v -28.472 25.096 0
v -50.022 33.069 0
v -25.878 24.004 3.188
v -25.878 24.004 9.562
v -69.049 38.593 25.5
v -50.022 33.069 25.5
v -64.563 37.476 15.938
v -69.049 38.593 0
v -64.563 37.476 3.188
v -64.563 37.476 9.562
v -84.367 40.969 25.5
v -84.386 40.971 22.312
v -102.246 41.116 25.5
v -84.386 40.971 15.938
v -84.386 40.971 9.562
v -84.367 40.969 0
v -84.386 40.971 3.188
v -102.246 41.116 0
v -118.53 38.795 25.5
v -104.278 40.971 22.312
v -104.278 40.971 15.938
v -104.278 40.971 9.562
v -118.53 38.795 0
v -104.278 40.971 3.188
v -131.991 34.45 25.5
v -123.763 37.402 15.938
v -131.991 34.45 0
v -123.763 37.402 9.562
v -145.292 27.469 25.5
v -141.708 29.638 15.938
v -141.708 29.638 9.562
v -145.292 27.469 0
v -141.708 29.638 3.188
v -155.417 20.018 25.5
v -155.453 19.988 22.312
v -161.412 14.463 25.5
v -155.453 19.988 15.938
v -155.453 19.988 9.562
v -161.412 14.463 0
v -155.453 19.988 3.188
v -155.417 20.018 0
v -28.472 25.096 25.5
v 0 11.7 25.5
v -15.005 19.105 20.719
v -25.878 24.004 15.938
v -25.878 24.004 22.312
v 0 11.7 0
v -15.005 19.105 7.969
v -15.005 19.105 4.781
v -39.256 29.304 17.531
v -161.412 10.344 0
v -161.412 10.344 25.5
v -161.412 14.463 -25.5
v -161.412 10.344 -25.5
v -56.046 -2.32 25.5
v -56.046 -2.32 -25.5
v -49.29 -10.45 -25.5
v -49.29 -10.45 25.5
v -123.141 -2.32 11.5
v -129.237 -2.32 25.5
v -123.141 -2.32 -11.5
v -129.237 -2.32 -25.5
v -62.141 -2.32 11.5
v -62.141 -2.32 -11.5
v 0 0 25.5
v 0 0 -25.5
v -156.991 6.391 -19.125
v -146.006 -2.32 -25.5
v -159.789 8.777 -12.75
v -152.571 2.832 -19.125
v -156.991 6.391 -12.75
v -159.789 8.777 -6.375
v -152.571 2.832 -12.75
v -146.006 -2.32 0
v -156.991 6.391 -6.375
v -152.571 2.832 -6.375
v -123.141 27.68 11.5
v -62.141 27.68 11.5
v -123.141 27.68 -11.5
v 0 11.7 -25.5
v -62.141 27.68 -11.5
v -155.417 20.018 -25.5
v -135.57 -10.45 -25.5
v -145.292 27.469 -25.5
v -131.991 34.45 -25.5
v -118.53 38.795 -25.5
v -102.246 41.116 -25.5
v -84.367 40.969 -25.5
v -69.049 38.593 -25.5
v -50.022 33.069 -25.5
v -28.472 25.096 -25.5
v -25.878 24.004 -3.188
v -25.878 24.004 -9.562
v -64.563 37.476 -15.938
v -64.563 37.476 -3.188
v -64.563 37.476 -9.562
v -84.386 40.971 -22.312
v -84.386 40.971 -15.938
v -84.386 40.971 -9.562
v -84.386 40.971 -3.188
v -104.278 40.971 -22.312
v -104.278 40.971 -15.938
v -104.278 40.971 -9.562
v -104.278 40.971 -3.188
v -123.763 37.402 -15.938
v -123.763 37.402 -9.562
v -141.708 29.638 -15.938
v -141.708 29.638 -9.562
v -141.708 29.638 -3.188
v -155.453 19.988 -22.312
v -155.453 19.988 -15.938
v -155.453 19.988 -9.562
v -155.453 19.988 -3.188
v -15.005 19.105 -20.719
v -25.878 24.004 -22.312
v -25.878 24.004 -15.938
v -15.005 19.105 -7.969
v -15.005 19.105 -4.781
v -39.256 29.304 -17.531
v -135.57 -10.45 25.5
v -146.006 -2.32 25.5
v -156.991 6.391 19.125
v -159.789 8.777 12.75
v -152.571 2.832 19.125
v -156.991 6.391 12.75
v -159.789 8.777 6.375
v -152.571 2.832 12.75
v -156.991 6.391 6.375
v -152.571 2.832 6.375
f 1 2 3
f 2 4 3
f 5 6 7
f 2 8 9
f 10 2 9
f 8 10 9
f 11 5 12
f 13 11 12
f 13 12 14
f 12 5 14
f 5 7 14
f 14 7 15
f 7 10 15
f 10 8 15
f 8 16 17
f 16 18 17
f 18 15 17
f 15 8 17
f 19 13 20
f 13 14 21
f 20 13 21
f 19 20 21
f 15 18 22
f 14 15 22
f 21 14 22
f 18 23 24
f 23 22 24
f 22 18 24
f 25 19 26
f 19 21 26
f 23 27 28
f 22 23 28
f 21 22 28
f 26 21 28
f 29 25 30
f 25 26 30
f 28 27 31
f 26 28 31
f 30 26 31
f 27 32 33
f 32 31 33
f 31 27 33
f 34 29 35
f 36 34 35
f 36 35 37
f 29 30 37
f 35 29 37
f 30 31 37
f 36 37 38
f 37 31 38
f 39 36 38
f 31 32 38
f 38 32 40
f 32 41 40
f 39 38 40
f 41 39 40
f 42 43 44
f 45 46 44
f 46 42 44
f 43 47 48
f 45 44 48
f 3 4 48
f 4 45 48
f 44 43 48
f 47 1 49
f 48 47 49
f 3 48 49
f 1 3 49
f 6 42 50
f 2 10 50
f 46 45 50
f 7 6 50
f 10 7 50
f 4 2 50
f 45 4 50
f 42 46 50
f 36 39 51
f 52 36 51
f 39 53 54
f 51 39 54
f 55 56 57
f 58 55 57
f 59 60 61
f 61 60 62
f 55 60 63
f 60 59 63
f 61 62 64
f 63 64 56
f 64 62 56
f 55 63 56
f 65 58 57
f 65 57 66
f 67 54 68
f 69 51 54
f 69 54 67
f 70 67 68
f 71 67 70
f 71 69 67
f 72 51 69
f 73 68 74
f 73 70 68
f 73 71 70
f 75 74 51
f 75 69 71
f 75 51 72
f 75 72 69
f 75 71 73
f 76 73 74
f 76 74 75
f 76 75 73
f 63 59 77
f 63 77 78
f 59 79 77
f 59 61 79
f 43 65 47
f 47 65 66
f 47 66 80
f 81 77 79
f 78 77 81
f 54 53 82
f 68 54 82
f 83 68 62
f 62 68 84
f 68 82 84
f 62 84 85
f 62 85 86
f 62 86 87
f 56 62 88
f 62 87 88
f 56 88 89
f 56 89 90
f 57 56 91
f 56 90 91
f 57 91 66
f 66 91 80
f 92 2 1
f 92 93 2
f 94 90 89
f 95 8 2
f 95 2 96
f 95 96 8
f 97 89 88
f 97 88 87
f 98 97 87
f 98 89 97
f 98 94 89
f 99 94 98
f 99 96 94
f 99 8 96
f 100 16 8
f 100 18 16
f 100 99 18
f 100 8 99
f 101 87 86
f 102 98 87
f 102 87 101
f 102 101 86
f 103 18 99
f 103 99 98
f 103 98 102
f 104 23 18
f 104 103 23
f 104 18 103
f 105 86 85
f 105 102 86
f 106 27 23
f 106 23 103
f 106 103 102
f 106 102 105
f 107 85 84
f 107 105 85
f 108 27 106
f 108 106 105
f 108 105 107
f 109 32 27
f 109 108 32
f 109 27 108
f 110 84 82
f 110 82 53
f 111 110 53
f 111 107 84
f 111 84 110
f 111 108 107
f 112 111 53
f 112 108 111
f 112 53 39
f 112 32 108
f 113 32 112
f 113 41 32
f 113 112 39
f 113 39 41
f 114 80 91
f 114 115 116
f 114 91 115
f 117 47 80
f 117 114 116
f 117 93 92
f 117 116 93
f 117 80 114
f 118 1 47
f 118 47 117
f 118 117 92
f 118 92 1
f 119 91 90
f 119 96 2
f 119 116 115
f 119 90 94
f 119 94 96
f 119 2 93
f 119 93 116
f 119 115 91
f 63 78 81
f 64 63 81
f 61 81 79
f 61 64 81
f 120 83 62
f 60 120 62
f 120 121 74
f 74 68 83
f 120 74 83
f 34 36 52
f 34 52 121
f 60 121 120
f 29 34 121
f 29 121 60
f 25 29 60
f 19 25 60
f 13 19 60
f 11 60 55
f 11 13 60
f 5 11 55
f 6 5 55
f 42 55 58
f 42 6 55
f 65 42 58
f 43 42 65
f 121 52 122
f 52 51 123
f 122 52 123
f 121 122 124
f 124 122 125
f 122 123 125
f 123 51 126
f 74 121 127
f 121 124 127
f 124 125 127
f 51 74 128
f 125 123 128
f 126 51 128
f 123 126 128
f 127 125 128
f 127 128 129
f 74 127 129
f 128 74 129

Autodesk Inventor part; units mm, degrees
ref_plane "YZ Plane" through (0, 0, 0) normal (1, 0, 0) x (0, 1, 0)
ref_plane "XZ Plane" through (0, 0, 0) normal (0, 1, 0) x (-1, 0, 0)
ref_plane "XY Plane" through (0, 0, 0) normal (0, 0, 1) x (1, 0, 0)
sketch "Sketch1" plane through (0, 0, 0) normal (0, 0, 1) x (1, 0, 0)
  line L0 (0, 0) -> (0, 11.7)
  line L1 (0, 11.7) -> (-17.808098, 20.803387) construction
  line L2 (-17.808098, 20.803387) -> (-17.808098, -4.366613) construction
  line L3 (-17.808098, 20.803387) -> (-36.228417, 28.593884) construction
  line L4 (-36.228417, 28.593884) -> (-36.228417, -7.036116) construction
  line L5 (-36.228417, 28.593884) -> (-55.195174, 34.939127) construction
  line L6 (-55.195174, 34.939127) -> (-55.195174, -9.670873) construction
  line L7 (-55.195174, 34.939127) -> (-74.374386, 40.609915) construction
  line L8 (-74.374386, 40.609915) -> (-74.374386, -1.710085) construction
  line L9 (-74.374386, 40.609915) -> (-94.331917, 41.912589) construction
  line L10 (-94.331917, 41.912589) -> (-94.331917, -2.507411) construction
  line L11 (-94.331917, 41.912589) -> (-114.289448, 40.609915) construction
  line L12 (-114.289448, 40.609915) -> (-114.289448, -1.700085) construction
  line L13 (-114.289448, 40.609915) -> (-133.46866, 34.939127) construction
  line L14 (-133.46866, 34.939127) -> (-133.46866, -4.930873) construction
  line L15 (-133.46866, 34.939127) -> (-150.648076, 24.698635) construction
  line L16 (-150.648076, 24.698635) -> (-150.648076, 8.628635) construction
  line L17 (-150.648076, 24.698635) -> (-161.411826, 14.681933) construction
  line L18 (-161.411826, 14.681933) -> (-161.411826, 9.681933)
  line L19 (-133.212221, -2.32016) -> (-56.045584, -2.32016) construction
  line L20 (-56.045584, -2.32016) -> (-49.29029, -10.449754) construction
  line L21 (-49.29029, -10.449754) -> (0, 0) construction
  line L22 (0, 11.7) -> (-17.808098, 20.803387) construction
  line L23 (-17.808098, 20.803387) -> (-36.228417, 28.593884) construction
  line L24 (-36.228417, 28.593884) -> (-55.195174, 34.939127) construction
  line L25 (-55.195174, 34.939127) -> (-74.374386, 40.609915) construction
  line L26 (-74.374386, 40.609915) -> (-94.331917, 41.912589) construction
  line L27 (-94.331917, 41.912589) -> (-114.289448, 40.609915) construction
  line L28 (-114.289448, 40.609915) -> (-133.46866, 34.939127) construction
  line L29 (-133.46866, 34.939127) -> (-150.648076, 24.698635) construction
  line L30 (-150.648076, 24.698635) -> (-161.411826, 14.681933) construction
  line L31 (-161.411826, 14.681933) -> (-163.905372, 12.361449) construction
  line L32 (-163.905372, 12.361449) -> (-161.411826, 9.681933) construction
  line L33 (-161.411826, 9.681933) -> (-146.00556, -2.32016) construction
  spline S0 degree 4 poles (0, 11.7) (-17.808098, 20.803387) (-36.228417, 28.593884) (-55.195174, 34.939127) (-74.374386, 40.609915) (-94.331917, 41.912589) (-114.289448, 40.609915) (-133.46866, 34.939127) (-150.648076, 24.698635) (-161.411826, 14.681933) (-163.905372, 12.361449) (-161.411826, 9.681933) (-146.00556, -2.32016) knots 1 1 1 1 1 2 3 4 5 6 7 8 9 10 10 10 10 10
  line L34 (-161.411826, 9.681933) -> (-135.570155, -10.449754)
  line L35 (-135.570155, -10.449754) -> (-129.236878, -2.32016)
  line L36 (-129.236878, -2.32016) -> (-56.045584, -2.32016)
  line L37 (-56.045584, -2.32016) -> (-49.29029, -10.449754)
  line L38 (-49.29029, -10.449754) -> (0, 0)
  point P0 (-161.411826, 14.46336)
  point P1 (-161.411826, 10.343905)
  dimension "d0" = 11.7
  dimension "d1" = 20
  dimension "d2" = 25.17
  dimension "d3" = 20
  dimension "d4" = 35.63
  dimension "d5" = 20
  dimension "d6" = 44.61
  dimension "d7" = 20
  dimension "d8" = 42.32
  dimension "d9" = 20
  dimension "d10" = 44.42
  dimension "d11" = 20
  dimension "d12" = 42.31
  dimension "d13" = 20
  dimension "d14" = 39.87
  dimension "d15" = 20
  dimension "d16" = 16.07
  dimension "d18" = 5
sketch "Sketch1 outline for Extrusion1" plane through (0, 0, 0) normal (0, 0, 1) x (1, 0, 0)
  line L0 (0, 0) -> (0, 11.7)
  line L1 (-49.29029, -10.449754) -> (0, 0)
  line L2 (-56.045584, -2.32016) -> (-49.29029, -10.449754)
  line L3 (-129.236878, -2.32016) -> (-56.045584, -2.32016)
  line L4 (-135.570155, -10.449754) -> (-129.236878, -2.32016)
  line L5 (-146.00556, -2.32016) -> (-135.570155, -10.449754)
  spline S0 degree 4 poles (-161.411826, 10.343905) (-160.249352, 9.082913) (-158.012669, 7.129136) (-153.839823, 3.783043) (-146.00556, -2.32016) knots 0 0 0 0 0 1 1 1 1 1
  line L6 (-161.411826, 14.46336) -> (-161.411826, 10.343905)
  spline S1 degree 4 poles (0, 11.7) (-17.808098, 20.803387) (-36.228417, 28.593884) (-55.195174, 34.939127) (-74.374386, 40.609915) (-94.331917, 41.912589) (-114.289448, 40.609915) (-133.46866, 34.939127) (-149.653381, 25.291563) (-157.445761, 18.34705) (-160.515633, 15.512952) (-161.411826, 14.46336) knots 0 0 0 0 0 0.12872666 0.25745332 0.38617998 0.51490664 0.6436333 0.77235995 0.90108661 1 1 1 1 1
extrude "Extrusion1" add sketch "Sketch1 outline for Extrusion1" along normal mid plane 51
sketch "Sketch2" plane through (-129.236878, -2.32016, 25.5) normal (0, -1, 0) x (1, 0, 0)
  line L0 (73.191293, -51) -> (73.191293, 0)
  line L1 (0, 0) -> (73.191293, 0)
  line L2 (0, -51) -> (0, 0)
  line L3 (73.191293, -51) -> (0, -51)
  line L4 (6.095647, -25.5) -> (6.095647, -14)
  line L5 (6.095647, -14) -> (67.095647, -14)
  line L6 (67.095647, -14) -> (67.095647, -37)
  line L7 (67.095647, -37) -> (6.095647, -37)
  line L8 (6.095647, -37) -> (6.095647, -25.5)
  point P0 (129.236878, -25.5)
  point P1 (36.595647, -25.5)
  dimension "d24" = 30.5
  dimension "d25" = 11.5
  dimension "d26" = 61
  dimension "d27" = 23
extrude "Extrusion2" cut sketch "Sketch2" against normal blind 30 contours L4 L5 L6 L7 L8
properties part number "F-WheelPants"
